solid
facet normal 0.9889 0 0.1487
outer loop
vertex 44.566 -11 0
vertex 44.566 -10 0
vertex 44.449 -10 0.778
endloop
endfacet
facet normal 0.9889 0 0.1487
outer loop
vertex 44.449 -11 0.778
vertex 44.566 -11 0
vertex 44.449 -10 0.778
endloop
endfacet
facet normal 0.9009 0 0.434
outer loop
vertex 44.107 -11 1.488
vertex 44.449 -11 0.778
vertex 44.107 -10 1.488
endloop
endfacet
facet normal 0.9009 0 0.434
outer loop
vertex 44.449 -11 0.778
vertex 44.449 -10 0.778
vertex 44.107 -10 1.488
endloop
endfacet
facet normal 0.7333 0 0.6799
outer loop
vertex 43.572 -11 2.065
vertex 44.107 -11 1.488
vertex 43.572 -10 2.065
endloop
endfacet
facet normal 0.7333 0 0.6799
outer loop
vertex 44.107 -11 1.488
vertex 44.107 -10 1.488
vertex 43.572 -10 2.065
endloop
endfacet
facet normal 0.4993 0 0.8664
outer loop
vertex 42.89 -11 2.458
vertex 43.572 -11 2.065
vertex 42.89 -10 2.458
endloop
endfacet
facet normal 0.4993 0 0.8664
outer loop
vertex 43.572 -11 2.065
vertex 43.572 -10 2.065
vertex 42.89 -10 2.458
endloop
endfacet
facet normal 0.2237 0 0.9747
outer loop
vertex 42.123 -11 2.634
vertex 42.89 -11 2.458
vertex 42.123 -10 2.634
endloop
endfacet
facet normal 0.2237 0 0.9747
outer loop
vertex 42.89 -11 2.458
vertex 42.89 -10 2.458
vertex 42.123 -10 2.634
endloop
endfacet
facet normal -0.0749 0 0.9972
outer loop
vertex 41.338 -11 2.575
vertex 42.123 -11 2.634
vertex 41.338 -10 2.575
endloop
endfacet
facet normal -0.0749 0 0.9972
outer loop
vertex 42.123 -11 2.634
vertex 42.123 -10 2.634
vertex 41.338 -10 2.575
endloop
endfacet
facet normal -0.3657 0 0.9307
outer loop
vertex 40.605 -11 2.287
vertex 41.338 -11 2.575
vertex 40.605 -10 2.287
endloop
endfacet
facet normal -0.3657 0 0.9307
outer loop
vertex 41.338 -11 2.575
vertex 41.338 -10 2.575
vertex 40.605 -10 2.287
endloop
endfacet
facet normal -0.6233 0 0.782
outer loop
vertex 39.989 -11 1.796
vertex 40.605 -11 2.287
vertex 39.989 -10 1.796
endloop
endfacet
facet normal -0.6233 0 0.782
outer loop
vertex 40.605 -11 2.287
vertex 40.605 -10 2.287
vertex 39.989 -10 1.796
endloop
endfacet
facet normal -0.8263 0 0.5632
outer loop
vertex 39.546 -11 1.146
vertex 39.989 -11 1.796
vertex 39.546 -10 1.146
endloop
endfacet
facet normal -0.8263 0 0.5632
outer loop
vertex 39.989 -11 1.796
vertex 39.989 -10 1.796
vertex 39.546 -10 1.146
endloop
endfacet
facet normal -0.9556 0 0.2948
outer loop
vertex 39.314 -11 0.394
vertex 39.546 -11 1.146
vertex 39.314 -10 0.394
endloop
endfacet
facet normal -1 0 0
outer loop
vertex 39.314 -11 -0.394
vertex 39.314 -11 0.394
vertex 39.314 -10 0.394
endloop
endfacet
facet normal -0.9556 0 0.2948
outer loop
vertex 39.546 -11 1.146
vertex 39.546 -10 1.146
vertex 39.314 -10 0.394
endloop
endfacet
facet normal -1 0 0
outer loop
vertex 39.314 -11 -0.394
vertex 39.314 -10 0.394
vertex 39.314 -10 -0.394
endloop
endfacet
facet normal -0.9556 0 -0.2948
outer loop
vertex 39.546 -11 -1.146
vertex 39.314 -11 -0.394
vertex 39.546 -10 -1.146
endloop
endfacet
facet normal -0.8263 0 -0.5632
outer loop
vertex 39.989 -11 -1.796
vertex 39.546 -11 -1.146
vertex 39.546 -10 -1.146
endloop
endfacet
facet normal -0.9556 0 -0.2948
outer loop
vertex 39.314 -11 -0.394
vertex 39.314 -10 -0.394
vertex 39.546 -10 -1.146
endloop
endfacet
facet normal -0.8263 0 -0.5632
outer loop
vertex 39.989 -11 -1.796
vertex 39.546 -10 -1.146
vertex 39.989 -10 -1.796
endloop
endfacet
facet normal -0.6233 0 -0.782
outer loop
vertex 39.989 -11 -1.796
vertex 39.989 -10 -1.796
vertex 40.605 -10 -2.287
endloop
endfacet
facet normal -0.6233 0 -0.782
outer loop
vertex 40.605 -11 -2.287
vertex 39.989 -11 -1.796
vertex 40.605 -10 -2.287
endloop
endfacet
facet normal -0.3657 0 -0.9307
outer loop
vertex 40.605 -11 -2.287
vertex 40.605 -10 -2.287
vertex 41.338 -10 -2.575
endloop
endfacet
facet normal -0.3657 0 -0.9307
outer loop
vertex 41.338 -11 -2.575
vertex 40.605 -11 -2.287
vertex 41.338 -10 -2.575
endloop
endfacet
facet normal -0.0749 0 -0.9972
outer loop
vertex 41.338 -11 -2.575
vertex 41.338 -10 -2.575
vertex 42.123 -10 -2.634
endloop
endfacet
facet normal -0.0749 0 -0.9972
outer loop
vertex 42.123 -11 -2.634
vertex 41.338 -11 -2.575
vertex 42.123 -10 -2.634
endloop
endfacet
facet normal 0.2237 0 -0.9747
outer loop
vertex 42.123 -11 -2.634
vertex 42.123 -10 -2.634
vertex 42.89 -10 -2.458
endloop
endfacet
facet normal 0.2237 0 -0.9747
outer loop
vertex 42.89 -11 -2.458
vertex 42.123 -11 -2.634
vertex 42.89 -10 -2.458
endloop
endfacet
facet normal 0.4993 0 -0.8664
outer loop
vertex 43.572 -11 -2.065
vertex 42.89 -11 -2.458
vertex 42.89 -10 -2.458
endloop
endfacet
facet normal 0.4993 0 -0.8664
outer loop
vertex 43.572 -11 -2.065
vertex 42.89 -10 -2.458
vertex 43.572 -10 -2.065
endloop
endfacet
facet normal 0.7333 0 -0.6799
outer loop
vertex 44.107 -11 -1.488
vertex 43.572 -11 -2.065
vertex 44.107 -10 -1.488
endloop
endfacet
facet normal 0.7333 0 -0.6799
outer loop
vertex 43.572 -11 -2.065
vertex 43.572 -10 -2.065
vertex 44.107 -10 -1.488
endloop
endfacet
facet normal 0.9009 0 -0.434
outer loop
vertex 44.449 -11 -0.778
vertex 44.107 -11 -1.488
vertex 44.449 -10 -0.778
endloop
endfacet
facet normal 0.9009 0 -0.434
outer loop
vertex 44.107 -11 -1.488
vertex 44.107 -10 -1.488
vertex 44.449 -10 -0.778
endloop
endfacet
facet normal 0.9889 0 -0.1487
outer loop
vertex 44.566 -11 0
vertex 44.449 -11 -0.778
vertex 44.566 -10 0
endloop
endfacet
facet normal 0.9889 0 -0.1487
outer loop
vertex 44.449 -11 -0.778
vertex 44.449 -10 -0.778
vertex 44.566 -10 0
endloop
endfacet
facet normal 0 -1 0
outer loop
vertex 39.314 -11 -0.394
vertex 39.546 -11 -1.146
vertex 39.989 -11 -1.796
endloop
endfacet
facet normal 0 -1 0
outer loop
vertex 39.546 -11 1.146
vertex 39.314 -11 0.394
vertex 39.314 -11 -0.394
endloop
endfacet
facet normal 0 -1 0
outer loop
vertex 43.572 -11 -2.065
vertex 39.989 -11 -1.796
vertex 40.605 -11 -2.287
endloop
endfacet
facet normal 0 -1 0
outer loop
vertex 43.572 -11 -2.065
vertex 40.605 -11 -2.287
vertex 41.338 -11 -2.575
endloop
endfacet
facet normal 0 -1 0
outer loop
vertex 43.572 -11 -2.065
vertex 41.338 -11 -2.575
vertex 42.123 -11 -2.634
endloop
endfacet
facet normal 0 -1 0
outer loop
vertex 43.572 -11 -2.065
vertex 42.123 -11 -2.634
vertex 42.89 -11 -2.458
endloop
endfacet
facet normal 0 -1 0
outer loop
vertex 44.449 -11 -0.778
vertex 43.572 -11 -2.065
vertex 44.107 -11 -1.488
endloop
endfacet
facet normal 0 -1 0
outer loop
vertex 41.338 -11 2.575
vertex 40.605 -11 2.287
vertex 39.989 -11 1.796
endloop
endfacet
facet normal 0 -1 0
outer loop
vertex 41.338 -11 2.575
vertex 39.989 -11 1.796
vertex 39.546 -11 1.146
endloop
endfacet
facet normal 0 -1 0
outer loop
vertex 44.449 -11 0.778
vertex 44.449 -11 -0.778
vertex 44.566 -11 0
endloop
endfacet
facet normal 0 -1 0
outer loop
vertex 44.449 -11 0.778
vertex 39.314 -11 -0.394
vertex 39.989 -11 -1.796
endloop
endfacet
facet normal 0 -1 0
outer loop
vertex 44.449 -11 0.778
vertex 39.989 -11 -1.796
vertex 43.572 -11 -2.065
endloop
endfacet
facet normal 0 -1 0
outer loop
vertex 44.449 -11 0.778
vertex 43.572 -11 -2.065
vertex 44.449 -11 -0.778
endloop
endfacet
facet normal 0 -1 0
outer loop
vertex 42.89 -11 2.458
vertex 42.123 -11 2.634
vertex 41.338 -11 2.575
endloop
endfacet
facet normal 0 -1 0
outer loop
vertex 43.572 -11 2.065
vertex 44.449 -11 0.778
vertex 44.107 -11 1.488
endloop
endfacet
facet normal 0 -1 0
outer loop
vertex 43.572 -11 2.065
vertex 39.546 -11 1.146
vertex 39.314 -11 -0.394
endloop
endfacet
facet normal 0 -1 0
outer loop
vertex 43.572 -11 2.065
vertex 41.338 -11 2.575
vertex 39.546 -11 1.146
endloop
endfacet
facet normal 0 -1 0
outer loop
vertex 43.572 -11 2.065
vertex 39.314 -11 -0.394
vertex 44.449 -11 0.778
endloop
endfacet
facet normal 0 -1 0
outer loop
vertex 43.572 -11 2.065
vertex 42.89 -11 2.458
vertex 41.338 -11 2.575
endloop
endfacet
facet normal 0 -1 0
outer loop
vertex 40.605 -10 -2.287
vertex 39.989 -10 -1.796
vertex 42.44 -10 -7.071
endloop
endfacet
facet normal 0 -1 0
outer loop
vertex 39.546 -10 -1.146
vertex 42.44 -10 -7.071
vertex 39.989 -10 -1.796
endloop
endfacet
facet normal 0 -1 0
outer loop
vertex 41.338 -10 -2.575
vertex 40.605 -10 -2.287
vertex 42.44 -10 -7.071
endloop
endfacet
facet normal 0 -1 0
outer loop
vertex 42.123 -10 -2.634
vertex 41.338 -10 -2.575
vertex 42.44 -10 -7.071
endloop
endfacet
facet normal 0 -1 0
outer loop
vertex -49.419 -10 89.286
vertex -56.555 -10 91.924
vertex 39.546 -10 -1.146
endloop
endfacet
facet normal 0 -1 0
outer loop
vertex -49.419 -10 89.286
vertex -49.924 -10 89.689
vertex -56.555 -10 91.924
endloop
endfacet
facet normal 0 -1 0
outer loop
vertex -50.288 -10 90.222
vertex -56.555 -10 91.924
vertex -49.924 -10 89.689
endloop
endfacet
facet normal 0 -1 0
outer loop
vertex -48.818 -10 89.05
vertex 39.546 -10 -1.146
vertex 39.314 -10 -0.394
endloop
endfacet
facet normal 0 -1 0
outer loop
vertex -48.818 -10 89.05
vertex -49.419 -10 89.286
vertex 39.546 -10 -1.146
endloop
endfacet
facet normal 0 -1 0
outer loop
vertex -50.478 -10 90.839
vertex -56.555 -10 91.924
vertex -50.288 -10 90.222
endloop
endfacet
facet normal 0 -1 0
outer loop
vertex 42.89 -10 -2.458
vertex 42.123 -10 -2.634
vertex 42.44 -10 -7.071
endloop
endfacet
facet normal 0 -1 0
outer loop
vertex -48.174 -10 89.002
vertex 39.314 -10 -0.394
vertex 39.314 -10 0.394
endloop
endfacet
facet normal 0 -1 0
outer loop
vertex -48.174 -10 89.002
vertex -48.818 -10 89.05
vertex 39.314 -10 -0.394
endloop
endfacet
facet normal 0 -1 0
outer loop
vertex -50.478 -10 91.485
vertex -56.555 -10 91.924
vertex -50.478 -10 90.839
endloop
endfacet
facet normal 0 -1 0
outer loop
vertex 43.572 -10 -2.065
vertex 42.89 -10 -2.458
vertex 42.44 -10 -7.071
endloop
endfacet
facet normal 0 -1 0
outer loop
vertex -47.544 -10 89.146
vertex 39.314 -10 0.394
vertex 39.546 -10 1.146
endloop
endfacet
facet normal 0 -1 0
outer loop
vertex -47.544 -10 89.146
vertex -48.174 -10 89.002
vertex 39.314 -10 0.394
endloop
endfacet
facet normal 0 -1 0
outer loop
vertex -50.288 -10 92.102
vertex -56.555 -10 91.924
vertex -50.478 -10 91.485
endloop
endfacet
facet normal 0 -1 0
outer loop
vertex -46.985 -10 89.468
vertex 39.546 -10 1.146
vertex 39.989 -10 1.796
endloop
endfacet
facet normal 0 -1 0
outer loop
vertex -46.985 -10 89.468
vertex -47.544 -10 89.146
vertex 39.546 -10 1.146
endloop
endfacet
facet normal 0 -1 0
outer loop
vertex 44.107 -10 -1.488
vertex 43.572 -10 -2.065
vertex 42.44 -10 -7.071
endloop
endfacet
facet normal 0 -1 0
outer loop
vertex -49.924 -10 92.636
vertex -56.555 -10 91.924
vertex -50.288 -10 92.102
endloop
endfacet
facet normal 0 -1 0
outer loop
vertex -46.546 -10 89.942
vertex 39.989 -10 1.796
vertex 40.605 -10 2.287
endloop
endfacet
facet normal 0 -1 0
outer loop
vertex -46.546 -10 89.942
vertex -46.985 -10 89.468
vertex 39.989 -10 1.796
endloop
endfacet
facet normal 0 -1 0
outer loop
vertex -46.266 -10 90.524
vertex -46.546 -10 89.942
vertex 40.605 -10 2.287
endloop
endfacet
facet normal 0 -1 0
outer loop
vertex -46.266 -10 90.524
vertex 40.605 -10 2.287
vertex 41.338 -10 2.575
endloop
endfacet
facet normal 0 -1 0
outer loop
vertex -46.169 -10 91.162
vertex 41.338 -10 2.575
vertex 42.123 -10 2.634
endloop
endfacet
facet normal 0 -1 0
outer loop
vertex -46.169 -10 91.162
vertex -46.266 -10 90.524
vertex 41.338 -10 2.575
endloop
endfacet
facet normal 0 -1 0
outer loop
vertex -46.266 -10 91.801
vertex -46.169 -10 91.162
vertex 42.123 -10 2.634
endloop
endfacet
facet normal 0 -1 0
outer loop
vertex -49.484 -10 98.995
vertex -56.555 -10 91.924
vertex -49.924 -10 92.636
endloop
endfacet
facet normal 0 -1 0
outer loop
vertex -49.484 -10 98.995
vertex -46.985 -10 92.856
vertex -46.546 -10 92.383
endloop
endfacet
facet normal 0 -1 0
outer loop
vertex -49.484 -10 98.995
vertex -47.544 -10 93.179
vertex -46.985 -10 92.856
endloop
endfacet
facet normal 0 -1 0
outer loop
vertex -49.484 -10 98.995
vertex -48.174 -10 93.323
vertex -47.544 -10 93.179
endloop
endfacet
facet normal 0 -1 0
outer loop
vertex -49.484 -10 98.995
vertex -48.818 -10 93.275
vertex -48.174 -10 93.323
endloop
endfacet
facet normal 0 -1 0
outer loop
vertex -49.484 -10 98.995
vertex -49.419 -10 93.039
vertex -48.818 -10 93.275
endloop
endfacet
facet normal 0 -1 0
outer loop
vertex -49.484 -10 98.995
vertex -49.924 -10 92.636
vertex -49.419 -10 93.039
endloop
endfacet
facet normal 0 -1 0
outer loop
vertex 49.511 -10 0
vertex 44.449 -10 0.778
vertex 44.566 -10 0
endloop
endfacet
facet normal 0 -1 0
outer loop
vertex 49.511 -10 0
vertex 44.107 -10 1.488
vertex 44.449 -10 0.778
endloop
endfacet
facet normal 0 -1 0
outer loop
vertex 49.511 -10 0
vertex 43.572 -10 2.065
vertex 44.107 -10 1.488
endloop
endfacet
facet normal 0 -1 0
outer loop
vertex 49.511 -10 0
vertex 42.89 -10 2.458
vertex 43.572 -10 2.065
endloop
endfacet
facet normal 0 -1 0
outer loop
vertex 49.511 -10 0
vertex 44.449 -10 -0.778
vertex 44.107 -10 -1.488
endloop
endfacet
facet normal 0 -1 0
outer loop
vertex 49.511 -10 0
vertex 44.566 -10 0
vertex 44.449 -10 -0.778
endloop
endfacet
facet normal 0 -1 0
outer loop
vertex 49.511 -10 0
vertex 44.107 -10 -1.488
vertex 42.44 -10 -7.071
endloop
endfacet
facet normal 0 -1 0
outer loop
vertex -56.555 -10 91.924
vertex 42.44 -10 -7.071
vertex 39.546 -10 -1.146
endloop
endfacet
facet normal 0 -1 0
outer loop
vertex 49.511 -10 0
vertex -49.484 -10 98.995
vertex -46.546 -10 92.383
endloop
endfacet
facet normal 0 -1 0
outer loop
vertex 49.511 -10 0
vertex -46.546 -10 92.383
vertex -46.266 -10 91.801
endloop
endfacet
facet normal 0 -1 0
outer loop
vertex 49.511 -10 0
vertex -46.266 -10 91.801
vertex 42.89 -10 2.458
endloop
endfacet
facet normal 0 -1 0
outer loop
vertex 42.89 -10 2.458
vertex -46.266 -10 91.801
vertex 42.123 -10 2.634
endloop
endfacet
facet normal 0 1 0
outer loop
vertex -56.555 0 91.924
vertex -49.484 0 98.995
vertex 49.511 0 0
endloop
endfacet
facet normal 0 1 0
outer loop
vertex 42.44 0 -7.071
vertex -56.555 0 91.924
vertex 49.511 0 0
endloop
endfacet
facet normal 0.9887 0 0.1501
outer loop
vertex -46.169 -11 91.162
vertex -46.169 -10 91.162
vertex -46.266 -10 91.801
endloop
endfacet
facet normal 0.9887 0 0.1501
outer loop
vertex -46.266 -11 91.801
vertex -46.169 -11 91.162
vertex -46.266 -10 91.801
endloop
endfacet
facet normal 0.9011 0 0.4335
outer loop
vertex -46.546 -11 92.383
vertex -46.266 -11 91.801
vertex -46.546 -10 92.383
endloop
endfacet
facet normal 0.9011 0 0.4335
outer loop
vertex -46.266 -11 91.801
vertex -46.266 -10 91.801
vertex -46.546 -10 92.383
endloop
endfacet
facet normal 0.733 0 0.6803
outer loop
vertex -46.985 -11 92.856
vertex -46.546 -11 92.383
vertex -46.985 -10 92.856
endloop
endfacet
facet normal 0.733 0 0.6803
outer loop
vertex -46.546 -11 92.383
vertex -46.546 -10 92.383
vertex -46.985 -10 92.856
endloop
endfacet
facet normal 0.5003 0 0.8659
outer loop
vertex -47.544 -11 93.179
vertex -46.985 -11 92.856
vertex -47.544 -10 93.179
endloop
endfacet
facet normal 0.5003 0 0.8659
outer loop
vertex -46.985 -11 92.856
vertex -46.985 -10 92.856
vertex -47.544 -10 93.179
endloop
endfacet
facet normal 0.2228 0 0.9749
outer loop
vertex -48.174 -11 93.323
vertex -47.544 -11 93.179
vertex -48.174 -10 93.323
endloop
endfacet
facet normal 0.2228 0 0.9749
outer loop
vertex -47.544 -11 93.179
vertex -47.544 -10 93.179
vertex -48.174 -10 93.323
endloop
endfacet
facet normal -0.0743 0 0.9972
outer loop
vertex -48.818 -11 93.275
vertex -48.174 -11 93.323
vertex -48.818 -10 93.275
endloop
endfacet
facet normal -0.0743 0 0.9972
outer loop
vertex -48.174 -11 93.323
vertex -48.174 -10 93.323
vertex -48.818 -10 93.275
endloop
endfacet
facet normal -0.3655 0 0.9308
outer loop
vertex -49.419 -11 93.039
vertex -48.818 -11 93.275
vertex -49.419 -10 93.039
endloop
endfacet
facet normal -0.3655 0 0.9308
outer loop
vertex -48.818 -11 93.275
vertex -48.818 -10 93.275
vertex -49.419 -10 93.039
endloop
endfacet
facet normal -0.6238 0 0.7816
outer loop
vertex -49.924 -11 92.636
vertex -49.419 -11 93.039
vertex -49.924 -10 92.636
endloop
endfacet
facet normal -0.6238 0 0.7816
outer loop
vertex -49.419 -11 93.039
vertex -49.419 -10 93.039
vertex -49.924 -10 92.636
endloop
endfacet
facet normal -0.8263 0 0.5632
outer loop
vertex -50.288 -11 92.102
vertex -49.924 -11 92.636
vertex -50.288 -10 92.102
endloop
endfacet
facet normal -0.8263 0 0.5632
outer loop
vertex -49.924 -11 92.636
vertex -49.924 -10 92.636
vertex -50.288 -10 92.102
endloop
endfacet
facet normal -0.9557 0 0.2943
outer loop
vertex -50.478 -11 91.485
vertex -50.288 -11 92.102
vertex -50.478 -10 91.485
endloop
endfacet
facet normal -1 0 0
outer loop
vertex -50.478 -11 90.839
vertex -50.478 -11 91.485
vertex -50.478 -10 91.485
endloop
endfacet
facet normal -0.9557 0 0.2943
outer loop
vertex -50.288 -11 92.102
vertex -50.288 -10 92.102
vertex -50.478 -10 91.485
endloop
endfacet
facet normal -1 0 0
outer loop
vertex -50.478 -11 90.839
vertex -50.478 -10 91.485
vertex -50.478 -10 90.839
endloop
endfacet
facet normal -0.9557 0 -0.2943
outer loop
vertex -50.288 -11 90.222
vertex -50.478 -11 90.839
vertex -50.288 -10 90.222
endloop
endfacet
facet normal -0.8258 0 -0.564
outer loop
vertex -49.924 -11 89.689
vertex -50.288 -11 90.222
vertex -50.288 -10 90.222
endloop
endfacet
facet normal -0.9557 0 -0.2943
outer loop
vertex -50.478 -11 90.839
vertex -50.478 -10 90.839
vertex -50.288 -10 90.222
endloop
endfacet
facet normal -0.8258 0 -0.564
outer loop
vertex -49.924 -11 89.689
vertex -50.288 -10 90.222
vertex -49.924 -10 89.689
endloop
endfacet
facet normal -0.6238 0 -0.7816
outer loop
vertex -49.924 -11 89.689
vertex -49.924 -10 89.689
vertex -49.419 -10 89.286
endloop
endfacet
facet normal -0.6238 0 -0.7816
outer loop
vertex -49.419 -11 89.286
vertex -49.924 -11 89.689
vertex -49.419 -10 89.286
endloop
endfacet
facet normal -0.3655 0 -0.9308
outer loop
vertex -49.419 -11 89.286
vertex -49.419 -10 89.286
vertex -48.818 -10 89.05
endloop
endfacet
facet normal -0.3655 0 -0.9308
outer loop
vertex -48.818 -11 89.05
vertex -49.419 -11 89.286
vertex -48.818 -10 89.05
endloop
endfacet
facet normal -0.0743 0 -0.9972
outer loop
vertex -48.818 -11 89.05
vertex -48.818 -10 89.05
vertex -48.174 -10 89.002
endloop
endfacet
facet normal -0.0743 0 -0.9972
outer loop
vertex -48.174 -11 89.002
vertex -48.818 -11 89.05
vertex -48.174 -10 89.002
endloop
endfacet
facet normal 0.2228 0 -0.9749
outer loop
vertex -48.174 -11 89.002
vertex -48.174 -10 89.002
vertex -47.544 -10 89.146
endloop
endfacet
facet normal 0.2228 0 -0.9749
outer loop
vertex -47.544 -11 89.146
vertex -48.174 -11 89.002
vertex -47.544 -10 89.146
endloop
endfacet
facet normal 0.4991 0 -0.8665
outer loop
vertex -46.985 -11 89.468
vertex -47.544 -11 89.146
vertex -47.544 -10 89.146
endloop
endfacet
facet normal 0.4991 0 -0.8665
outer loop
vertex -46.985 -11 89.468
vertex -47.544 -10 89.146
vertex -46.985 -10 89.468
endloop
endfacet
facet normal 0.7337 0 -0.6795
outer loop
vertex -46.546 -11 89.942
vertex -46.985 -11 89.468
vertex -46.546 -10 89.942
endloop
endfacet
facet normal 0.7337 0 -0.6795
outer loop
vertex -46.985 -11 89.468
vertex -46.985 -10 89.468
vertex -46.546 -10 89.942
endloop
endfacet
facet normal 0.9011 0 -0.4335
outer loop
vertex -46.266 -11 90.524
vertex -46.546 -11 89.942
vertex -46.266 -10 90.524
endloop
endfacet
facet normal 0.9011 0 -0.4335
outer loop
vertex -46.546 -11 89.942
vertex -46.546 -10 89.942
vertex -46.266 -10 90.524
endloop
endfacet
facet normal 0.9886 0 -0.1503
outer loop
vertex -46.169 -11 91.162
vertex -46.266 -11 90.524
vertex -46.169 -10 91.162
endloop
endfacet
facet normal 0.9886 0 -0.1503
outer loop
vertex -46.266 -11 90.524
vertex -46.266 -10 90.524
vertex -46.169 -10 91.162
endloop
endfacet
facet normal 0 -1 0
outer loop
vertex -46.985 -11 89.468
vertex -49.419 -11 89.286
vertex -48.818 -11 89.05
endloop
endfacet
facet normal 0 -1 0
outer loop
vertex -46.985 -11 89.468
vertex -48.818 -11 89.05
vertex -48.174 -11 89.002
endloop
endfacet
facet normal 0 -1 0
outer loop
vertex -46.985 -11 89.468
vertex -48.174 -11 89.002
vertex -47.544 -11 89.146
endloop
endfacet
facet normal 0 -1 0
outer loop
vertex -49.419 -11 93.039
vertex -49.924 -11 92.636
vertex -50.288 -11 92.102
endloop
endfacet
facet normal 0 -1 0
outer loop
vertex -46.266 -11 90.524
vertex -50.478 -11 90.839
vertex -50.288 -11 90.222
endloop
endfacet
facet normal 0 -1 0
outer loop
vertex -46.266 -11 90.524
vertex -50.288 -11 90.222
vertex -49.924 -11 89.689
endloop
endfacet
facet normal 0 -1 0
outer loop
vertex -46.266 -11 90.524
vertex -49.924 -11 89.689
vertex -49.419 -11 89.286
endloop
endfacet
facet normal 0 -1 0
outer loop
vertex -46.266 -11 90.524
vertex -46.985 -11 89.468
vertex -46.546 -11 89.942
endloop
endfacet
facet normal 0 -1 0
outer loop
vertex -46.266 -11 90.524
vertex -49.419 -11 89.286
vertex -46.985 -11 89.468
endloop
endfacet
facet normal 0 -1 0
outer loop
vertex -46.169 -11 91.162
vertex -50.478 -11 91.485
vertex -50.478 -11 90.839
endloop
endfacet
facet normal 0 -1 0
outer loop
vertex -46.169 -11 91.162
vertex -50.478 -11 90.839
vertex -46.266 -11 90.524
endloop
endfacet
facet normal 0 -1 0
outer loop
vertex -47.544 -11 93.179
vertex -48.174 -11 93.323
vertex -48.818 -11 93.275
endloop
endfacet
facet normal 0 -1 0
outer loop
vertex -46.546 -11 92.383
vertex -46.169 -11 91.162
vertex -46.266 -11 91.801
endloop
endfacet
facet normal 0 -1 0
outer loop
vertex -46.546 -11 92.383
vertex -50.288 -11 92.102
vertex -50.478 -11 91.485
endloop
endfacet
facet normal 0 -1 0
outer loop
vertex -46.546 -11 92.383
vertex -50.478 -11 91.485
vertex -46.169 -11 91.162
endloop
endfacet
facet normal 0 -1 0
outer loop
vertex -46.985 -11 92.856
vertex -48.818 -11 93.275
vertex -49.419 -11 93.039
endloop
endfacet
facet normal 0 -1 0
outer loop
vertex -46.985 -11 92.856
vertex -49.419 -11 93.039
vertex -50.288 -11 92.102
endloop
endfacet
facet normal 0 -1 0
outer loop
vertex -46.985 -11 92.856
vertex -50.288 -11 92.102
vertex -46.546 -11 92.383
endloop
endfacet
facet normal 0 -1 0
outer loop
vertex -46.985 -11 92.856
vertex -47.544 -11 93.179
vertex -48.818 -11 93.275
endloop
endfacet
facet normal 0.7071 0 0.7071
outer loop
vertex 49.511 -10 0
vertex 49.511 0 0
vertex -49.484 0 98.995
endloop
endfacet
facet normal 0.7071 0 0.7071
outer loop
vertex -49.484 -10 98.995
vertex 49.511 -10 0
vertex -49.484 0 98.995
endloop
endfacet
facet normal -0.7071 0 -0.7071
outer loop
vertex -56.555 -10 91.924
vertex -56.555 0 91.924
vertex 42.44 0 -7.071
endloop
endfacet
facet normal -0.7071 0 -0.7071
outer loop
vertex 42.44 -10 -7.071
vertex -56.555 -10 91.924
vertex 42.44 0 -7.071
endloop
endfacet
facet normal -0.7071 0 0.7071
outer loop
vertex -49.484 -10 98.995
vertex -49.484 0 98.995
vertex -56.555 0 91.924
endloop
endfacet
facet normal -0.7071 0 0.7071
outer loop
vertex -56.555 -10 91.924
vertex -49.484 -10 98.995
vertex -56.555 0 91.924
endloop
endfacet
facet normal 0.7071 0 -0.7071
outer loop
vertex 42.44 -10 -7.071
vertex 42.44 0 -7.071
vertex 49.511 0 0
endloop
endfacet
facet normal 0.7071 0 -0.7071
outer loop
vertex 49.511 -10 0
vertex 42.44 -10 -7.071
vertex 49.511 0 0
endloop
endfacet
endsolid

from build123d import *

# Parameters (mm, degrees)
F1_DEPTH = 10
F2_R     = 2.6409813422
F2_R_2   = 2.1665688489
F3_DEPTH = 1


# Not quite as in the source:
# - a feature names something its author has since deleted; it is built from what else it names


with BuildPart() as f1:
    # F0 (on Front) → F1 (new body)
    with BuildSketch(Plane.XZ):
        Polygon((-49.4838858729, 98.9949493661), (-56.5549536848, 91.9238815543), (42.4399956814, -7.0710678119), (49.5110634932, 0), align=None)
    extrude(amount=F1_DEPTH)

    # F2 (on face) → F3 (join)
    with BuildSketch(Plane.XZ.offset(10)):
        with Locations((41.9252365828, 0)):
            Circle(F2_R)
        with Locations((-48.3359694481, 91.1623910069)):
            Circle(F2_R_2)
    extrude(amount=F3_DEPTH)


solid = f1.part
